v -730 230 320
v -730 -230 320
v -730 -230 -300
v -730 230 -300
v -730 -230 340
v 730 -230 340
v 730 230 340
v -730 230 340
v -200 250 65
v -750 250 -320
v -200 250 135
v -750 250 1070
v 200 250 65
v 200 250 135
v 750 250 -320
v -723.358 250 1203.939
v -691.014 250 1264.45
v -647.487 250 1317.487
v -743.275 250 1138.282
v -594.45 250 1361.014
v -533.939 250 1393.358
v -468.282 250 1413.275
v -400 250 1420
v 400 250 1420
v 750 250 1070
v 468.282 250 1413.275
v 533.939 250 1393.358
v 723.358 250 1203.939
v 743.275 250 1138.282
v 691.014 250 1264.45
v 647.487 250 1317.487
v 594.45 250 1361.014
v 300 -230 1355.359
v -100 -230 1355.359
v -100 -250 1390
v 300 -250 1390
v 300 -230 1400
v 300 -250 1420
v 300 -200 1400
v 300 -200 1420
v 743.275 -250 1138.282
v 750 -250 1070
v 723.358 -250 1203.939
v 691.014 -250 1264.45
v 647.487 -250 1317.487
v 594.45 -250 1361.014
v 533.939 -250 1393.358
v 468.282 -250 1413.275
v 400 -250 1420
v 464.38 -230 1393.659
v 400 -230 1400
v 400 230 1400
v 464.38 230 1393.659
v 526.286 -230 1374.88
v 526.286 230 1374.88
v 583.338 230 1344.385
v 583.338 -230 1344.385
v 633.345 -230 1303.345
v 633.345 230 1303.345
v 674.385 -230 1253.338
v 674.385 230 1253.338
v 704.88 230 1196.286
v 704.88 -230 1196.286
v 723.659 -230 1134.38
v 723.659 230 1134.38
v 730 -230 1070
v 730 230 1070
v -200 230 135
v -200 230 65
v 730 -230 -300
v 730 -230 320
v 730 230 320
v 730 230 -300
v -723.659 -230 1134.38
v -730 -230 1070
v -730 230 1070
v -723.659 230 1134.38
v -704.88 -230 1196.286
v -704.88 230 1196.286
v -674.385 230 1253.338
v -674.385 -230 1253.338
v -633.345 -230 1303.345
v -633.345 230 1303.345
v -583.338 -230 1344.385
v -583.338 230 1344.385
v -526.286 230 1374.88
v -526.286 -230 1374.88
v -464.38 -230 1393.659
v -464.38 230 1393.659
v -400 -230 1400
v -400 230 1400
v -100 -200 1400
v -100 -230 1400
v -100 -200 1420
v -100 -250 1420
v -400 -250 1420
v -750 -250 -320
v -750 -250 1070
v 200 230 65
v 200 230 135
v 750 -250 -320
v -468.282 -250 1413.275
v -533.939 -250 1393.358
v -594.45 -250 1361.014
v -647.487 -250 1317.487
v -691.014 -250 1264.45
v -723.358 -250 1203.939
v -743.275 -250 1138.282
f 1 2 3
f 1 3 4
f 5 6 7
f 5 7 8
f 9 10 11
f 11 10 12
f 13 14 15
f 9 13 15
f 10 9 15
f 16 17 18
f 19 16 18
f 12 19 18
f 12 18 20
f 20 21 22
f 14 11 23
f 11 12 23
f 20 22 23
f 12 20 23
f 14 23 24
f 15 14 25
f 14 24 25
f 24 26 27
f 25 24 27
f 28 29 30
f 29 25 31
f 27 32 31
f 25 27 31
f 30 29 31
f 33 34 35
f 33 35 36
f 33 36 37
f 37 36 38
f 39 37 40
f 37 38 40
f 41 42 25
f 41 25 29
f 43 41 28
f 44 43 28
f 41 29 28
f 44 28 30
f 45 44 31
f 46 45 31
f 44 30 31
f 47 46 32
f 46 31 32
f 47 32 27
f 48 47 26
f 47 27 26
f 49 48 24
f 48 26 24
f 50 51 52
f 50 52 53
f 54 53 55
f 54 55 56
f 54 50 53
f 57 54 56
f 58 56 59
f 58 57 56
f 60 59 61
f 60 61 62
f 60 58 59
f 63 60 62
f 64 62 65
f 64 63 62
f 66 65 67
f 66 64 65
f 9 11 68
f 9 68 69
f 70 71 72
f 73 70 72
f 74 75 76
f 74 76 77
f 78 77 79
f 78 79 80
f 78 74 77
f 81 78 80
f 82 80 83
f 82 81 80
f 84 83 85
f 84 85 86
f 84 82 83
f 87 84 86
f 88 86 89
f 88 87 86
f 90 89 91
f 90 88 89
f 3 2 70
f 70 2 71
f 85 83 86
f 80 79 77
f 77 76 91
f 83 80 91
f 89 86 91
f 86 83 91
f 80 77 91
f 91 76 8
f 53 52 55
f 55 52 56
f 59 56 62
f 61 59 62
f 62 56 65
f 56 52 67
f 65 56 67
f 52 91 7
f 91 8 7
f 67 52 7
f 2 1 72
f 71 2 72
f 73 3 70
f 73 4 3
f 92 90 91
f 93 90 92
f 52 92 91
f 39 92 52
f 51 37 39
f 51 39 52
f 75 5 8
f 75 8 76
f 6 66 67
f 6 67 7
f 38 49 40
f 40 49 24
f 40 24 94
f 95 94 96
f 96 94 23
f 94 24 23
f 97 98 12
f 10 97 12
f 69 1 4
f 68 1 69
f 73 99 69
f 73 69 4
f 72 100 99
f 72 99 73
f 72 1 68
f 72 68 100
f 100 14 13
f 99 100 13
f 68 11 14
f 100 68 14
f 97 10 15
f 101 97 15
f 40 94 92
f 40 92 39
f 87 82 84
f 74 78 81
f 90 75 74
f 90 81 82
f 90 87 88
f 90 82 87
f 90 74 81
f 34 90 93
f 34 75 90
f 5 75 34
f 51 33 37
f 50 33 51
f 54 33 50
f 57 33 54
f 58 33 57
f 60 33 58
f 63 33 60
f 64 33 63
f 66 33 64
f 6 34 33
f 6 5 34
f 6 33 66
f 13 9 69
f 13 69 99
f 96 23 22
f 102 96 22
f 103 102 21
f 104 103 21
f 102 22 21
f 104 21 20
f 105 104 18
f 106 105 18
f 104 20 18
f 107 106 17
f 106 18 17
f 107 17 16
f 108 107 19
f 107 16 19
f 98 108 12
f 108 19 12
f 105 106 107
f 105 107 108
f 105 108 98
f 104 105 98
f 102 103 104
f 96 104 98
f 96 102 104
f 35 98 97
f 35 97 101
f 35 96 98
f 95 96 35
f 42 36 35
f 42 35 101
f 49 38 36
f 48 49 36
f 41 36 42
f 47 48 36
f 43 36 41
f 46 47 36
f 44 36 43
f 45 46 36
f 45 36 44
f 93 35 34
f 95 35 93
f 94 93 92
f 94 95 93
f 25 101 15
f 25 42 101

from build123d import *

# Parameters (mm, degrees)
SKETCH1_W           = 1500
SKETCH1_H           = 500
BOSS_EXTRUDE1_DEPTH = 320
SHELL1_T            = 20
SKETCH3_W           = 400
SKETCH3_H           = 70
CUT_EXTRUDE2_DEPTH  = 30
SKETCH4_W           = 1460
SKETCH4_H           = 460
CUT_EXTRUDE3_DEPTH  = 30
BOSS_EXTRUDE2_DEPTH = 500
SHELL2_START        = -230
SHELL2_DEPTH        = 460
SKETCH6_W           = 400
SKETCH6_H           = 50
CUT_EXTRUDE4_DEPTH  = 30
CHAMFER1_SIZE2      = 34.641016151
CHAMFER1_SIZE       = 20


# Read off the part's stored shape, not the designer's step: Shell2
with BuildPart() as part:
    # Sketch1 → Boss-Extrude1 (new, symmetric)
    with BuildSketch(Plane.XY):
        Rectangle(SKETCH1_W, SKETCH1_H)
    extrude(amount=BOSS_EXTRUDE1_DEPTH, both=True)

    # Shell1 (no face opened: a closed hollow body)
    add(offset(amount=-SHELL1_T, mode=Mode.PRIVATE), mode=Mode.SUBTRACT)

    # Sketch3 → Cut-Extrude2 (cut)
    with BuildSketch(Plane(origin=(0, 250, 0), x_dir=(1, 0, 0), z_dir=(0, 1, 0))):
        with Locations((0, -100)):
            Rectangle(SKETCH3_W, SKETCH3_H)
    extrude(amount=-CUT_EXTRUDE2_DEPTH, mode=Mode.SUBTRACT)

    # Sketch4 → Cut-Extrude3 (cut)
    with BuildSketch(Plane.XY.offset(320)):
        Rectangle(SKETCH4_W, SKETCH4_H)
    extrude(amount=-CUT_EXTRUDE3_DEPTH, mode=Mode.SUBTRACT)

    # Sketch5 → Boss-Extrude2 (add)
    with BuildSketch(Plane(origin=(0, 250, 0), x_dir=(1, 0, 0), z_dir=(0, 1, 0))):
        with BuildLine():
            Line((-750, -320), (750, -320))
            Line((750, -320), (750, -1070))
            ThreePointArc((750, -1070), (647.487373415, -1317.487373415), (400, -1420))
            Line((400, -1420), (-400, -1420))
            ThreePointArc((-400, -1420), (-647.487373415, -1317.487373415), (-750, -1070))
            Line((-750, -1070), (-750, -320))
        make_face()
    extrude(amount=-BOSS_EXTRUDE2_DEPTH)

    # Shell2 outline → Shell2 (cut)
    with BuildSketch(Plane(origin=(0, 0, 0), x_dir=(1, 0, 0), z_dir=(0, 1, 0)).offset(SHELL2_START)):
        with BuildLine():
            Line((730, -1070), (730, -340))
            Line((730, -340), (-730, -340))
            Line((-730, -340), (-730, -1070))
            ThreePointArc((-730, -1070), (-633.345237792, -1303.345237792), (-400, -1400))
            Line((-400, -1400), (400, -1400))
            ThreePointArc((400, -1400), (633.345237792, -1303.345237792), (730, -1070))
        make_face()
    extrude(amount=SHELL2_DEPTH, mode=Mode.SUBTRACT)

    # Sketch6 → Cut-Extrude4 (cut)
    with BuildSketch(Plane.XY.offset(1420)):
        with Locations((100, -225)):
            Rectangle(SKETCH6_W, SKETCH6_H)
    extrude(amount=-CUT_EXTRUDE4_DEPTH, mode=Mode.SUBTRACT)

    # Chamfer1
    chamfer1_edges = [part.edges().sort_by_distance(p)[0] for p in [
        (100, -230, 1390),
    ]]
    chamfer1_side = [part.faces().sort_by_distance(p)[0] for p in [
        (100, -230.4, 1390),
    ]]
    chamfer(chamfer1_edges, length=CHAMFER1_SIZE - 0.0001, length2=CHAMFER1_SIZE2 - 0.0001, reference=chamfer1_side[0])  # a hair under: the kernel refuses the full size


solid = part.part
